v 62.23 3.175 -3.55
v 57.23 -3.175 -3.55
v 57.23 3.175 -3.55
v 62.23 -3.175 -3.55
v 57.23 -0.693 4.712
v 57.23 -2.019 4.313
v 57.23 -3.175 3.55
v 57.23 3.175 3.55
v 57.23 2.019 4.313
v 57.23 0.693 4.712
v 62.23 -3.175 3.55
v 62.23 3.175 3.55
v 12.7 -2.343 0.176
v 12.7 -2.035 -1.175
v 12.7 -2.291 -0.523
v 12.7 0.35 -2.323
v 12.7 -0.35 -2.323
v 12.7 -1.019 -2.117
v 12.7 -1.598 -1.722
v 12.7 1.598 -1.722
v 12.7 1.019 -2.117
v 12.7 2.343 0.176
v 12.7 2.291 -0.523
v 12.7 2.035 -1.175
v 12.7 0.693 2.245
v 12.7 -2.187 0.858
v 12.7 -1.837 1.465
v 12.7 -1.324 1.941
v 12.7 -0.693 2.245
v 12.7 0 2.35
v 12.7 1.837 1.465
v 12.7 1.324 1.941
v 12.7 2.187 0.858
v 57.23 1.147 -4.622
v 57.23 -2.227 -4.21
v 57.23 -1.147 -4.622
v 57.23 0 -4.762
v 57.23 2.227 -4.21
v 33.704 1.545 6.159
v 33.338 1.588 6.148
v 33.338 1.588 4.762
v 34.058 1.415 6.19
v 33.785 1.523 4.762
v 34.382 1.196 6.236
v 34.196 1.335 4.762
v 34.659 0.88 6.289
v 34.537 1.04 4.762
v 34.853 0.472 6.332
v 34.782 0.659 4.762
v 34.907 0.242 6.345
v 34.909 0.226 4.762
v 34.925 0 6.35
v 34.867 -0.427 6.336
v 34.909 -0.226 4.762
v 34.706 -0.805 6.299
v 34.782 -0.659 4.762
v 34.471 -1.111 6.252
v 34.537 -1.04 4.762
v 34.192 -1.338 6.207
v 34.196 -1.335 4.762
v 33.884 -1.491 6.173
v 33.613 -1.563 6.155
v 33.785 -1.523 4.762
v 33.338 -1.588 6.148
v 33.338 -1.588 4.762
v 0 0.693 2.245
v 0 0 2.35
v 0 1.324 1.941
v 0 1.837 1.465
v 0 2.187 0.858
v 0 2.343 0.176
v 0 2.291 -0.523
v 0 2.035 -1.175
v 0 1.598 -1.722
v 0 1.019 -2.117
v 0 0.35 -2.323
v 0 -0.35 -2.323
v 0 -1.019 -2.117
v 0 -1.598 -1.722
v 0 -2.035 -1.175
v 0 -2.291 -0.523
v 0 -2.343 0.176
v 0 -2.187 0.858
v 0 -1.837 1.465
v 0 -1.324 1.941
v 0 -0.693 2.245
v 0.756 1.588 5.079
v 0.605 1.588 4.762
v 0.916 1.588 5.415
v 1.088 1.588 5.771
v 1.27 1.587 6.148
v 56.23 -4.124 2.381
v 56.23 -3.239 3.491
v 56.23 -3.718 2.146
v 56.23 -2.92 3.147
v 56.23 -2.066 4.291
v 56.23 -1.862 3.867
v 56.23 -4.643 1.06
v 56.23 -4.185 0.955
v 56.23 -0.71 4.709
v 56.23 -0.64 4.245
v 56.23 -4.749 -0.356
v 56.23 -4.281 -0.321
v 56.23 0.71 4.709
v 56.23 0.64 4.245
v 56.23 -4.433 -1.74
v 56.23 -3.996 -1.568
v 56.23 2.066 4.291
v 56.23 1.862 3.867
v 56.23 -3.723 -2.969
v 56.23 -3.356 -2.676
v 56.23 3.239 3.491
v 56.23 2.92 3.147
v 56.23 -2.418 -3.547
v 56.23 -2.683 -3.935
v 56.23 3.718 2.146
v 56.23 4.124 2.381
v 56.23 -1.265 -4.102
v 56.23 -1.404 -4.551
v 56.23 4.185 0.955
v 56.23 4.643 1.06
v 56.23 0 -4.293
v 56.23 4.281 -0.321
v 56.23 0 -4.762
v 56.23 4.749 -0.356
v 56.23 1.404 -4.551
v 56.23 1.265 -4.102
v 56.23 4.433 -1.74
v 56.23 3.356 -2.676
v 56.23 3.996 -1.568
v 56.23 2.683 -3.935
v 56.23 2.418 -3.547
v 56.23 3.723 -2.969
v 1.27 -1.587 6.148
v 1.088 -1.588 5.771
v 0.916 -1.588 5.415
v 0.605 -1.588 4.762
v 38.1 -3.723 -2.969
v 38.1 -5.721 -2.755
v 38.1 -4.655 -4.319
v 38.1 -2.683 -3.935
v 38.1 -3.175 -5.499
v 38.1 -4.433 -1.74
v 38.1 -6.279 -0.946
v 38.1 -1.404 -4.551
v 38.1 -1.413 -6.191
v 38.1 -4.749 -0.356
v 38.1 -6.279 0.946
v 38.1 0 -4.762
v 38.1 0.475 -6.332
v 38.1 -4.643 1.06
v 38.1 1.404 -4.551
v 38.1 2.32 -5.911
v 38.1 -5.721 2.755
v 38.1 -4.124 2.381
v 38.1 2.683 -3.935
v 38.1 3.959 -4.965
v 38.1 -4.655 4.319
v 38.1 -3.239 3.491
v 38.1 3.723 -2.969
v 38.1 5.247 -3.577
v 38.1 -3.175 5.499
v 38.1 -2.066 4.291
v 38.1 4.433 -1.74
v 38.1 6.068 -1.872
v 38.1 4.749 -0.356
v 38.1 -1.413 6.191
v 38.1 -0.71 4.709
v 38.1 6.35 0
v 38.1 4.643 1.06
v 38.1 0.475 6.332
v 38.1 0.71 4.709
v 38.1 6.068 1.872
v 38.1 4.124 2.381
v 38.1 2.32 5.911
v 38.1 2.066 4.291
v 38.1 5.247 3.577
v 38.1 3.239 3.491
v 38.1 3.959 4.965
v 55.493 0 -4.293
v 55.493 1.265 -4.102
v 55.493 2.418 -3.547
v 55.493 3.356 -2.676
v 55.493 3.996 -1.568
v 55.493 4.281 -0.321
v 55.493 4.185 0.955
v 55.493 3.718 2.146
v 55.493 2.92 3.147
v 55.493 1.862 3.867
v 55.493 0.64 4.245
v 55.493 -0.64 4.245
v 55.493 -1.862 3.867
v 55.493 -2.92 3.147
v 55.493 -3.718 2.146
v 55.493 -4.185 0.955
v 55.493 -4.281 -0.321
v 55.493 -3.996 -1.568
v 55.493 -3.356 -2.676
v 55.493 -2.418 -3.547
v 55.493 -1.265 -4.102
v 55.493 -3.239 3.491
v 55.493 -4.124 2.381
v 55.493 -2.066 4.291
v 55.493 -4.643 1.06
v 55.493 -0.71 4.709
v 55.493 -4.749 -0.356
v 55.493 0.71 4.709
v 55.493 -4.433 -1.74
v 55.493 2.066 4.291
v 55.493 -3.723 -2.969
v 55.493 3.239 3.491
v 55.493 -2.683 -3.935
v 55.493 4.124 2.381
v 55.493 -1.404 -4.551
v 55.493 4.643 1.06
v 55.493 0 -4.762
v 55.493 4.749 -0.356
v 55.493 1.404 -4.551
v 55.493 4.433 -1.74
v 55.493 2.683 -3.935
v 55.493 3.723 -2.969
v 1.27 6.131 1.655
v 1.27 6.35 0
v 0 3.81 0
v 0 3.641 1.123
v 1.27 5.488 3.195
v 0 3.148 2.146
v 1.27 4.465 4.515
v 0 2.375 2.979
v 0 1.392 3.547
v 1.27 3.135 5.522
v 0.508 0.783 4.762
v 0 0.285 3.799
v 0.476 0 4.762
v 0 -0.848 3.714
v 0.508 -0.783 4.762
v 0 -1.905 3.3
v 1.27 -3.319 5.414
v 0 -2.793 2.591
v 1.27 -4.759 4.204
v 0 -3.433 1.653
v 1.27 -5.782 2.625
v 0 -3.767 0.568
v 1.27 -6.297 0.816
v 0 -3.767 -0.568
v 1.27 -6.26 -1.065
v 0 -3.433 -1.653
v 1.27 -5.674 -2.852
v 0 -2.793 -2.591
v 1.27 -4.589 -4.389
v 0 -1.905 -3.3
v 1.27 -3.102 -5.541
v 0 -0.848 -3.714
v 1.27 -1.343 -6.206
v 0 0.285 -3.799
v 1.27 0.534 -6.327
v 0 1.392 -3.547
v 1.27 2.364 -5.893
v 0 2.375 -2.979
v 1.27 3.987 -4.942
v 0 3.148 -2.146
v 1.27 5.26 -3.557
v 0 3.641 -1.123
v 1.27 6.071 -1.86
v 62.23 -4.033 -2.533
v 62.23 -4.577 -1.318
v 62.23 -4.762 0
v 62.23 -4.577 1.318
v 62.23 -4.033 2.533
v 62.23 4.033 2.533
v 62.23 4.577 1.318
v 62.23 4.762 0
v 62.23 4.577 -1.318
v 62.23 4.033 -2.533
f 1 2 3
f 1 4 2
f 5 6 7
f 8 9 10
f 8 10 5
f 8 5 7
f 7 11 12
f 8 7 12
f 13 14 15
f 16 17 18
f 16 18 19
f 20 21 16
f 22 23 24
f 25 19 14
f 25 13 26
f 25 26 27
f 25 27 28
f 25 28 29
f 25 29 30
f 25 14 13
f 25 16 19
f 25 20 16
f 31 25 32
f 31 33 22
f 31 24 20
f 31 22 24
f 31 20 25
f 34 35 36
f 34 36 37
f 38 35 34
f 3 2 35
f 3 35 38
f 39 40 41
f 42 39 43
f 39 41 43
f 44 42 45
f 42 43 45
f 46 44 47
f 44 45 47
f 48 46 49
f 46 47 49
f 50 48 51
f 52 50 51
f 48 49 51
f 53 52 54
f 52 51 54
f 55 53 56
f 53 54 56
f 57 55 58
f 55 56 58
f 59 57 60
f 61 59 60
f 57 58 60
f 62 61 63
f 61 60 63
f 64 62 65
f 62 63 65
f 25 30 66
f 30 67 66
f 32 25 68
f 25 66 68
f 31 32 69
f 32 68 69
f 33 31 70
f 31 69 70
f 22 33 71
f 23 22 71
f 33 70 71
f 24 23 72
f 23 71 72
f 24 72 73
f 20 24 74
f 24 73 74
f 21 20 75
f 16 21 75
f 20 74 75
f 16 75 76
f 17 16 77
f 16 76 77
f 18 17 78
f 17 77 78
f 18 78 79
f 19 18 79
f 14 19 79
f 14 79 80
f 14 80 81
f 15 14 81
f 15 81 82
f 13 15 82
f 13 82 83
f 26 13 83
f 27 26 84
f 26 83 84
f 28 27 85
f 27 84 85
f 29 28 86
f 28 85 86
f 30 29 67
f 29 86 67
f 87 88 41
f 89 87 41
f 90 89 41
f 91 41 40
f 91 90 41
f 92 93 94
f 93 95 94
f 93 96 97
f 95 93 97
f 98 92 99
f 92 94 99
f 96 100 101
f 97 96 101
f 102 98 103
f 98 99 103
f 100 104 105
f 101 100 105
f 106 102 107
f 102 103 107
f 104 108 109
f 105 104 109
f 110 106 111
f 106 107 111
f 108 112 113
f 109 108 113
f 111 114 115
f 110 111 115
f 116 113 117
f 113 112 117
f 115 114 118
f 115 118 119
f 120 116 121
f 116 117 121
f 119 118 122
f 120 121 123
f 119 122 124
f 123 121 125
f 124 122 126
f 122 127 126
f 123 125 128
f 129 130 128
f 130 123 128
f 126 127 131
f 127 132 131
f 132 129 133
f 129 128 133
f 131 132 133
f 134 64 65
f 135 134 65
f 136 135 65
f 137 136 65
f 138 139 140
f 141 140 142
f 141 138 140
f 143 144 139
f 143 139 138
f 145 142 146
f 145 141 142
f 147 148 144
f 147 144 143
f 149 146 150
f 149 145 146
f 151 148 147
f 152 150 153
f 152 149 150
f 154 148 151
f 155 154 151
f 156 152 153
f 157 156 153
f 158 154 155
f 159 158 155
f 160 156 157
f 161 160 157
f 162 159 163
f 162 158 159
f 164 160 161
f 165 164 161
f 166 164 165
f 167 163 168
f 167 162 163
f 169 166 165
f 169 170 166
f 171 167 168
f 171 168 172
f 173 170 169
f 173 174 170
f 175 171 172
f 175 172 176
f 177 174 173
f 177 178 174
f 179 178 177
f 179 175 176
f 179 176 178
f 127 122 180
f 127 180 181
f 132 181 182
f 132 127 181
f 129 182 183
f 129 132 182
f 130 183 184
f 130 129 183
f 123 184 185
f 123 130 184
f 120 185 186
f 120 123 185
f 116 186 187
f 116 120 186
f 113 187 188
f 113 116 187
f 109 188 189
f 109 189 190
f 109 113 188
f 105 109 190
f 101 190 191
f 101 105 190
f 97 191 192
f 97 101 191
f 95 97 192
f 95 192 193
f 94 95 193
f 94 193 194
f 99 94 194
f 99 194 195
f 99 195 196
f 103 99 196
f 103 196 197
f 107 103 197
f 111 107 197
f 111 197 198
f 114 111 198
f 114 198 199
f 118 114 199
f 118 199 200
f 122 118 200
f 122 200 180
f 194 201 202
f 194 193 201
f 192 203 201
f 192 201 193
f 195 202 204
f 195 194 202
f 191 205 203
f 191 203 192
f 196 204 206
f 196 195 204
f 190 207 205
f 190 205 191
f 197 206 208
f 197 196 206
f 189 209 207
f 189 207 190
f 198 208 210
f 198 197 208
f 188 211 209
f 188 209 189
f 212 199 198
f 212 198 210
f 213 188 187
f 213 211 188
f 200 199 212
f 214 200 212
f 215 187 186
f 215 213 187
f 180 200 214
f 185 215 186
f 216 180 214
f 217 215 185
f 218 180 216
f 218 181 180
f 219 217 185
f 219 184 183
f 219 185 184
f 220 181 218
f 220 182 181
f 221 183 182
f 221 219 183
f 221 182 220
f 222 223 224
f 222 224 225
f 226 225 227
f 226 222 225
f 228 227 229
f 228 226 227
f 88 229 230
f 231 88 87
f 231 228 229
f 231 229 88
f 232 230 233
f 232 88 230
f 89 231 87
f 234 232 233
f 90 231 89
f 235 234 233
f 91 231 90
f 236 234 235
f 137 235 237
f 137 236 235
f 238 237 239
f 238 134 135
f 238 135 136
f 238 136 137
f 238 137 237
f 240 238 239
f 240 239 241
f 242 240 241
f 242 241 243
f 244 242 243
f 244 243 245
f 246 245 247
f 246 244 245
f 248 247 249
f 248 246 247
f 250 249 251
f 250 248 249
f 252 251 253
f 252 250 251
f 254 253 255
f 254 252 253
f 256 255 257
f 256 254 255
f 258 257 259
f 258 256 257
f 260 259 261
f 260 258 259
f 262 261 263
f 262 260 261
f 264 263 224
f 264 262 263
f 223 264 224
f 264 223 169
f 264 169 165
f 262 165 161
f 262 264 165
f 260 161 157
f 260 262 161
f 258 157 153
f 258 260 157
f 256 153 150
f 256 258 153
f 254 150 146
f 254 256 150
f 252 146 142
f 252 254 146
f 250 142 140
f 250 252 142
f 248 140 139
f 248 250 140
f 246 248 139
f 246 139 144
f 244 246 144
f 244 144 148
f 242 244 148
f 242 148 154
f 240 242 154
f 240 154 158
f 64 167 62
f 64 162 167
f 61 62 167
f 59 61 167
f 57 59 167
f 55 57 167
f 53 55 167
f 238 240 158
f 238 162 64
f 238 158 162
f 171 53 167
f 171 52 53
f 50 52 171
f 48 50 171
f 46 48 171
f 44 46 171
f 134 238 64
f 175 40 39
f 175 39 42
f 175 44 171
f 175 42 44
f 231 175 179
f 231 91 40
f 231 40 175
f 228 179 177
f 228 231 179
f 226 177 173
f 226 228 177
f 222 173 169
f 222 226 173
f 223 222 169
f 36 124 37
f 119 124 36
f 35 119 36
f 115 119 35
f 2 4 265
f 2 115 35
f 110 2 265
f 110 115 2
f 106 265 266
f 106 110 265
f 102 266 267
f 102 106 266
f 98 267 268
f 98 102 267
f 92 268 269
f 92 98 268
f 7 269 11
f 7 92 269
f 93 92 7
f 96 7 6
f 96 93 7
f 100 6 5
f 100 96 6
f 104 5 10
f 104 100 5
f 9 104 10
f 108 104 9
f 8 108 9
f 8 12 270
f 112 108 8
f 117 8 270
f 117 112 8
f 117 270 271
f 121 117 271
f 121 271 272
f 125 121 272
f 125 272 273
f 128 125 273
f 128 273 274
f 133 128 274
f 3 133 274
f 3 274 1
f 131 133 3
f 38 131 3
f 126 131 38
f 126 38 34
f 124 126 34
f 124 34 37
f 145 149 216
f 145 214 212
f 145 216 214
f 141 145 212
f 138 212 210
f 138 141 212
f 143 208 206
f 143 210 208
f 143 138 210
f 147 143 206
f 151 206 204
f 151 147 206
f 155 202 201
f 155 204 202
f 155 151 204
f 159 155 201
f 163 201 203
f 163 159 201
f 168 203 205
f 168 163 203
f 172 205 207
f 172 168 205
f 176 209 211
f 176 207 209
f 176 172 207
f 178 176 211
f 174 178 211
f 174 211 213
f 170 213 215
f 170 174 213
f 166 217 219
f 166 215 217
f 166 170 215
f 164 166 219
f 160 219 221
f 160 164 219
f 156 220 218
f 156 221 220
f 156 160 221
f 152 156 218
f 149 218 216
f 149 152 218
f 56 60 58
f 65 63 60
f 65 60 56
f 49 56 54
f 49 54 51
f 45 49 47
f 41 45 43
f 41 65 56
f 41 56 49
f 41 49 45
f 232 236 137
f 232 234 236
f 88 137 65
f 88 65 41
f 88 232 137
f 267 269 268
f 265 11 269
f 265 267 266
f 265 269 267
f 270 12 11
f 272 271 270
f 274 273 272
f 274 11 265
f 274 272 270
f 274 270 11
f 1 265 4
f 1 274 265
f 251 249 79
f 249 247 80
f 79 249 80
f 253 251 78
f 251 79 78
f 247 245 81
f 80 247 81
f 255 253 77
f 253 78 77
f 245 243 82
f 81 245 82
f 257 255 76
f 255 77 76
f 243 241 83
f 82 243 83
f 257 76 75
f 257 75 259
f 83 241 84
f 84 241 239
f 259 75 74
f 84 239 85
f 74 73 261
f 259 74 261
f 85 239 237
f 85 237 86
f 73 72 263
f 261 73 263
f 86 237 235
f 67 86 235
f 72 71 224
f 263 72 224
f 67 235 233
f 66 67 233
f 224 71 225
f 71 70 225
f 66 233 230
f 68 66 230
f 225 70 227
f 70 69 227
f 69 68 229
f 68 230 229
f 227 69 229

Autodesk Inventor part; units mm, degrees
ref_plane "YZ Plane" through (0, 0, 0) normal (1, 0, 0) x (0, 1, 0)
ref_plane "XZ Plane" through (0, 0, 0) normal (0, 1, 0) x (-1, 0, 0)
sketch "Sketch1" plane through (0, 0, 0) normal (1, 0, 0) x (0, 1, 0)
  circle A0 centre (0, 0) radius 6.35
  line L0 (0, 0) -> (0, 6.35) construction
  line L1 (-1.5875, 6.1484) -> (-1.5875, 4.7625)
  line L2 (-1.5875, 4.7625) -> (1.5875, 4.7625)
  line L3 (1.5875, 4.7625) -> (1.5875, 6.1484)
  point P0 (0, 4.7625)
  dimension "d0" = 12.7
  dimension "d2" = 1.5875
  dimension "d3" = 3.175
extrude "Extrusion1" add sketch "Sketch1" along normal blind 38.1
sketch "Sketch2" plane through (38.1, 0, 0) normal (1, 0, 0) x (0, 0, -1)
  circle A0 centre (0, 0) radius 6.35 projected
  circle A1 centre (0, 0) radius 4.7625
  dimension "d6" = 9.525
extrude "Extrusion2" add sketch "Sketch2" along normal blind 24.13 contours A1
extrude "Extrusion3" cut sketch "Sketch1" along normal blind 34.925 contours L3 L2 L1 A0 picked at (0.1781, 5.2842)
fillet "Fillet1" radius 1.5875 2 edges at (34.925, 1.5875, 5.4554) (34.925, -1.5875, 5.4554)
chamfer "Chamfer1" distance 1.27 distance2 2.54 1 edges at (0, 0, -6.35) measured on face at (25.4, -3.3725, 5.3804)
sketch "Sketch3" plane through (0, 0, 0) normal (-1, 0, 0) x (0, 0, 1)
  circle A0 centre (0, 0) radius 3.81 projected
  circle A1 centre (0, 0) radius 2.3495
  dimension "d16" = 4.699
extrude "Extrusion4" cut sketch "Sketch3" against normal blind 12.7 contours A1
thread "Thread1" size "10-32 UNF" class "2B" standard "ANSI Unified Screw Threads" full length
sketch "Sketch4" plane through (62.23, 0, 0) normal (1, 0, 0) x (0, 0, -1)
  circle A0 centre (0, 0) radius 4.7625 projected
  line L0 (-3.5498, -3.175) -> (-3.5498, 3.175)
  line L1 (3.5498, -3.175) -> (3.5498, 3.175)
  dimension "d24" = 6.35
extrude "Extrusion5" cut sketch "Sketch4" against normal blind 5 contours A0 L1 | L0 A0
ref_plane "Work Plane1" through (56.23, 0, 0) normal (1, 0, 0) x (0, 0, -1)
sketch "Sketch5" plane through (56.23, 0, 0) normal (1, 0, 0) x (0, 0, -1)
  circle A0 centre (0, 0) radius 4.7625 projected
  circle A1 centre (0, 0) radius 4.2926
  dimension "d28" = 8.5852
extrude "Extrusion6" cut sketch "Sketch5" against normal blind 0.7366
properties part number "Banebots 0.5x1.5 P60 Shaft" material "Steel, Carbon"
